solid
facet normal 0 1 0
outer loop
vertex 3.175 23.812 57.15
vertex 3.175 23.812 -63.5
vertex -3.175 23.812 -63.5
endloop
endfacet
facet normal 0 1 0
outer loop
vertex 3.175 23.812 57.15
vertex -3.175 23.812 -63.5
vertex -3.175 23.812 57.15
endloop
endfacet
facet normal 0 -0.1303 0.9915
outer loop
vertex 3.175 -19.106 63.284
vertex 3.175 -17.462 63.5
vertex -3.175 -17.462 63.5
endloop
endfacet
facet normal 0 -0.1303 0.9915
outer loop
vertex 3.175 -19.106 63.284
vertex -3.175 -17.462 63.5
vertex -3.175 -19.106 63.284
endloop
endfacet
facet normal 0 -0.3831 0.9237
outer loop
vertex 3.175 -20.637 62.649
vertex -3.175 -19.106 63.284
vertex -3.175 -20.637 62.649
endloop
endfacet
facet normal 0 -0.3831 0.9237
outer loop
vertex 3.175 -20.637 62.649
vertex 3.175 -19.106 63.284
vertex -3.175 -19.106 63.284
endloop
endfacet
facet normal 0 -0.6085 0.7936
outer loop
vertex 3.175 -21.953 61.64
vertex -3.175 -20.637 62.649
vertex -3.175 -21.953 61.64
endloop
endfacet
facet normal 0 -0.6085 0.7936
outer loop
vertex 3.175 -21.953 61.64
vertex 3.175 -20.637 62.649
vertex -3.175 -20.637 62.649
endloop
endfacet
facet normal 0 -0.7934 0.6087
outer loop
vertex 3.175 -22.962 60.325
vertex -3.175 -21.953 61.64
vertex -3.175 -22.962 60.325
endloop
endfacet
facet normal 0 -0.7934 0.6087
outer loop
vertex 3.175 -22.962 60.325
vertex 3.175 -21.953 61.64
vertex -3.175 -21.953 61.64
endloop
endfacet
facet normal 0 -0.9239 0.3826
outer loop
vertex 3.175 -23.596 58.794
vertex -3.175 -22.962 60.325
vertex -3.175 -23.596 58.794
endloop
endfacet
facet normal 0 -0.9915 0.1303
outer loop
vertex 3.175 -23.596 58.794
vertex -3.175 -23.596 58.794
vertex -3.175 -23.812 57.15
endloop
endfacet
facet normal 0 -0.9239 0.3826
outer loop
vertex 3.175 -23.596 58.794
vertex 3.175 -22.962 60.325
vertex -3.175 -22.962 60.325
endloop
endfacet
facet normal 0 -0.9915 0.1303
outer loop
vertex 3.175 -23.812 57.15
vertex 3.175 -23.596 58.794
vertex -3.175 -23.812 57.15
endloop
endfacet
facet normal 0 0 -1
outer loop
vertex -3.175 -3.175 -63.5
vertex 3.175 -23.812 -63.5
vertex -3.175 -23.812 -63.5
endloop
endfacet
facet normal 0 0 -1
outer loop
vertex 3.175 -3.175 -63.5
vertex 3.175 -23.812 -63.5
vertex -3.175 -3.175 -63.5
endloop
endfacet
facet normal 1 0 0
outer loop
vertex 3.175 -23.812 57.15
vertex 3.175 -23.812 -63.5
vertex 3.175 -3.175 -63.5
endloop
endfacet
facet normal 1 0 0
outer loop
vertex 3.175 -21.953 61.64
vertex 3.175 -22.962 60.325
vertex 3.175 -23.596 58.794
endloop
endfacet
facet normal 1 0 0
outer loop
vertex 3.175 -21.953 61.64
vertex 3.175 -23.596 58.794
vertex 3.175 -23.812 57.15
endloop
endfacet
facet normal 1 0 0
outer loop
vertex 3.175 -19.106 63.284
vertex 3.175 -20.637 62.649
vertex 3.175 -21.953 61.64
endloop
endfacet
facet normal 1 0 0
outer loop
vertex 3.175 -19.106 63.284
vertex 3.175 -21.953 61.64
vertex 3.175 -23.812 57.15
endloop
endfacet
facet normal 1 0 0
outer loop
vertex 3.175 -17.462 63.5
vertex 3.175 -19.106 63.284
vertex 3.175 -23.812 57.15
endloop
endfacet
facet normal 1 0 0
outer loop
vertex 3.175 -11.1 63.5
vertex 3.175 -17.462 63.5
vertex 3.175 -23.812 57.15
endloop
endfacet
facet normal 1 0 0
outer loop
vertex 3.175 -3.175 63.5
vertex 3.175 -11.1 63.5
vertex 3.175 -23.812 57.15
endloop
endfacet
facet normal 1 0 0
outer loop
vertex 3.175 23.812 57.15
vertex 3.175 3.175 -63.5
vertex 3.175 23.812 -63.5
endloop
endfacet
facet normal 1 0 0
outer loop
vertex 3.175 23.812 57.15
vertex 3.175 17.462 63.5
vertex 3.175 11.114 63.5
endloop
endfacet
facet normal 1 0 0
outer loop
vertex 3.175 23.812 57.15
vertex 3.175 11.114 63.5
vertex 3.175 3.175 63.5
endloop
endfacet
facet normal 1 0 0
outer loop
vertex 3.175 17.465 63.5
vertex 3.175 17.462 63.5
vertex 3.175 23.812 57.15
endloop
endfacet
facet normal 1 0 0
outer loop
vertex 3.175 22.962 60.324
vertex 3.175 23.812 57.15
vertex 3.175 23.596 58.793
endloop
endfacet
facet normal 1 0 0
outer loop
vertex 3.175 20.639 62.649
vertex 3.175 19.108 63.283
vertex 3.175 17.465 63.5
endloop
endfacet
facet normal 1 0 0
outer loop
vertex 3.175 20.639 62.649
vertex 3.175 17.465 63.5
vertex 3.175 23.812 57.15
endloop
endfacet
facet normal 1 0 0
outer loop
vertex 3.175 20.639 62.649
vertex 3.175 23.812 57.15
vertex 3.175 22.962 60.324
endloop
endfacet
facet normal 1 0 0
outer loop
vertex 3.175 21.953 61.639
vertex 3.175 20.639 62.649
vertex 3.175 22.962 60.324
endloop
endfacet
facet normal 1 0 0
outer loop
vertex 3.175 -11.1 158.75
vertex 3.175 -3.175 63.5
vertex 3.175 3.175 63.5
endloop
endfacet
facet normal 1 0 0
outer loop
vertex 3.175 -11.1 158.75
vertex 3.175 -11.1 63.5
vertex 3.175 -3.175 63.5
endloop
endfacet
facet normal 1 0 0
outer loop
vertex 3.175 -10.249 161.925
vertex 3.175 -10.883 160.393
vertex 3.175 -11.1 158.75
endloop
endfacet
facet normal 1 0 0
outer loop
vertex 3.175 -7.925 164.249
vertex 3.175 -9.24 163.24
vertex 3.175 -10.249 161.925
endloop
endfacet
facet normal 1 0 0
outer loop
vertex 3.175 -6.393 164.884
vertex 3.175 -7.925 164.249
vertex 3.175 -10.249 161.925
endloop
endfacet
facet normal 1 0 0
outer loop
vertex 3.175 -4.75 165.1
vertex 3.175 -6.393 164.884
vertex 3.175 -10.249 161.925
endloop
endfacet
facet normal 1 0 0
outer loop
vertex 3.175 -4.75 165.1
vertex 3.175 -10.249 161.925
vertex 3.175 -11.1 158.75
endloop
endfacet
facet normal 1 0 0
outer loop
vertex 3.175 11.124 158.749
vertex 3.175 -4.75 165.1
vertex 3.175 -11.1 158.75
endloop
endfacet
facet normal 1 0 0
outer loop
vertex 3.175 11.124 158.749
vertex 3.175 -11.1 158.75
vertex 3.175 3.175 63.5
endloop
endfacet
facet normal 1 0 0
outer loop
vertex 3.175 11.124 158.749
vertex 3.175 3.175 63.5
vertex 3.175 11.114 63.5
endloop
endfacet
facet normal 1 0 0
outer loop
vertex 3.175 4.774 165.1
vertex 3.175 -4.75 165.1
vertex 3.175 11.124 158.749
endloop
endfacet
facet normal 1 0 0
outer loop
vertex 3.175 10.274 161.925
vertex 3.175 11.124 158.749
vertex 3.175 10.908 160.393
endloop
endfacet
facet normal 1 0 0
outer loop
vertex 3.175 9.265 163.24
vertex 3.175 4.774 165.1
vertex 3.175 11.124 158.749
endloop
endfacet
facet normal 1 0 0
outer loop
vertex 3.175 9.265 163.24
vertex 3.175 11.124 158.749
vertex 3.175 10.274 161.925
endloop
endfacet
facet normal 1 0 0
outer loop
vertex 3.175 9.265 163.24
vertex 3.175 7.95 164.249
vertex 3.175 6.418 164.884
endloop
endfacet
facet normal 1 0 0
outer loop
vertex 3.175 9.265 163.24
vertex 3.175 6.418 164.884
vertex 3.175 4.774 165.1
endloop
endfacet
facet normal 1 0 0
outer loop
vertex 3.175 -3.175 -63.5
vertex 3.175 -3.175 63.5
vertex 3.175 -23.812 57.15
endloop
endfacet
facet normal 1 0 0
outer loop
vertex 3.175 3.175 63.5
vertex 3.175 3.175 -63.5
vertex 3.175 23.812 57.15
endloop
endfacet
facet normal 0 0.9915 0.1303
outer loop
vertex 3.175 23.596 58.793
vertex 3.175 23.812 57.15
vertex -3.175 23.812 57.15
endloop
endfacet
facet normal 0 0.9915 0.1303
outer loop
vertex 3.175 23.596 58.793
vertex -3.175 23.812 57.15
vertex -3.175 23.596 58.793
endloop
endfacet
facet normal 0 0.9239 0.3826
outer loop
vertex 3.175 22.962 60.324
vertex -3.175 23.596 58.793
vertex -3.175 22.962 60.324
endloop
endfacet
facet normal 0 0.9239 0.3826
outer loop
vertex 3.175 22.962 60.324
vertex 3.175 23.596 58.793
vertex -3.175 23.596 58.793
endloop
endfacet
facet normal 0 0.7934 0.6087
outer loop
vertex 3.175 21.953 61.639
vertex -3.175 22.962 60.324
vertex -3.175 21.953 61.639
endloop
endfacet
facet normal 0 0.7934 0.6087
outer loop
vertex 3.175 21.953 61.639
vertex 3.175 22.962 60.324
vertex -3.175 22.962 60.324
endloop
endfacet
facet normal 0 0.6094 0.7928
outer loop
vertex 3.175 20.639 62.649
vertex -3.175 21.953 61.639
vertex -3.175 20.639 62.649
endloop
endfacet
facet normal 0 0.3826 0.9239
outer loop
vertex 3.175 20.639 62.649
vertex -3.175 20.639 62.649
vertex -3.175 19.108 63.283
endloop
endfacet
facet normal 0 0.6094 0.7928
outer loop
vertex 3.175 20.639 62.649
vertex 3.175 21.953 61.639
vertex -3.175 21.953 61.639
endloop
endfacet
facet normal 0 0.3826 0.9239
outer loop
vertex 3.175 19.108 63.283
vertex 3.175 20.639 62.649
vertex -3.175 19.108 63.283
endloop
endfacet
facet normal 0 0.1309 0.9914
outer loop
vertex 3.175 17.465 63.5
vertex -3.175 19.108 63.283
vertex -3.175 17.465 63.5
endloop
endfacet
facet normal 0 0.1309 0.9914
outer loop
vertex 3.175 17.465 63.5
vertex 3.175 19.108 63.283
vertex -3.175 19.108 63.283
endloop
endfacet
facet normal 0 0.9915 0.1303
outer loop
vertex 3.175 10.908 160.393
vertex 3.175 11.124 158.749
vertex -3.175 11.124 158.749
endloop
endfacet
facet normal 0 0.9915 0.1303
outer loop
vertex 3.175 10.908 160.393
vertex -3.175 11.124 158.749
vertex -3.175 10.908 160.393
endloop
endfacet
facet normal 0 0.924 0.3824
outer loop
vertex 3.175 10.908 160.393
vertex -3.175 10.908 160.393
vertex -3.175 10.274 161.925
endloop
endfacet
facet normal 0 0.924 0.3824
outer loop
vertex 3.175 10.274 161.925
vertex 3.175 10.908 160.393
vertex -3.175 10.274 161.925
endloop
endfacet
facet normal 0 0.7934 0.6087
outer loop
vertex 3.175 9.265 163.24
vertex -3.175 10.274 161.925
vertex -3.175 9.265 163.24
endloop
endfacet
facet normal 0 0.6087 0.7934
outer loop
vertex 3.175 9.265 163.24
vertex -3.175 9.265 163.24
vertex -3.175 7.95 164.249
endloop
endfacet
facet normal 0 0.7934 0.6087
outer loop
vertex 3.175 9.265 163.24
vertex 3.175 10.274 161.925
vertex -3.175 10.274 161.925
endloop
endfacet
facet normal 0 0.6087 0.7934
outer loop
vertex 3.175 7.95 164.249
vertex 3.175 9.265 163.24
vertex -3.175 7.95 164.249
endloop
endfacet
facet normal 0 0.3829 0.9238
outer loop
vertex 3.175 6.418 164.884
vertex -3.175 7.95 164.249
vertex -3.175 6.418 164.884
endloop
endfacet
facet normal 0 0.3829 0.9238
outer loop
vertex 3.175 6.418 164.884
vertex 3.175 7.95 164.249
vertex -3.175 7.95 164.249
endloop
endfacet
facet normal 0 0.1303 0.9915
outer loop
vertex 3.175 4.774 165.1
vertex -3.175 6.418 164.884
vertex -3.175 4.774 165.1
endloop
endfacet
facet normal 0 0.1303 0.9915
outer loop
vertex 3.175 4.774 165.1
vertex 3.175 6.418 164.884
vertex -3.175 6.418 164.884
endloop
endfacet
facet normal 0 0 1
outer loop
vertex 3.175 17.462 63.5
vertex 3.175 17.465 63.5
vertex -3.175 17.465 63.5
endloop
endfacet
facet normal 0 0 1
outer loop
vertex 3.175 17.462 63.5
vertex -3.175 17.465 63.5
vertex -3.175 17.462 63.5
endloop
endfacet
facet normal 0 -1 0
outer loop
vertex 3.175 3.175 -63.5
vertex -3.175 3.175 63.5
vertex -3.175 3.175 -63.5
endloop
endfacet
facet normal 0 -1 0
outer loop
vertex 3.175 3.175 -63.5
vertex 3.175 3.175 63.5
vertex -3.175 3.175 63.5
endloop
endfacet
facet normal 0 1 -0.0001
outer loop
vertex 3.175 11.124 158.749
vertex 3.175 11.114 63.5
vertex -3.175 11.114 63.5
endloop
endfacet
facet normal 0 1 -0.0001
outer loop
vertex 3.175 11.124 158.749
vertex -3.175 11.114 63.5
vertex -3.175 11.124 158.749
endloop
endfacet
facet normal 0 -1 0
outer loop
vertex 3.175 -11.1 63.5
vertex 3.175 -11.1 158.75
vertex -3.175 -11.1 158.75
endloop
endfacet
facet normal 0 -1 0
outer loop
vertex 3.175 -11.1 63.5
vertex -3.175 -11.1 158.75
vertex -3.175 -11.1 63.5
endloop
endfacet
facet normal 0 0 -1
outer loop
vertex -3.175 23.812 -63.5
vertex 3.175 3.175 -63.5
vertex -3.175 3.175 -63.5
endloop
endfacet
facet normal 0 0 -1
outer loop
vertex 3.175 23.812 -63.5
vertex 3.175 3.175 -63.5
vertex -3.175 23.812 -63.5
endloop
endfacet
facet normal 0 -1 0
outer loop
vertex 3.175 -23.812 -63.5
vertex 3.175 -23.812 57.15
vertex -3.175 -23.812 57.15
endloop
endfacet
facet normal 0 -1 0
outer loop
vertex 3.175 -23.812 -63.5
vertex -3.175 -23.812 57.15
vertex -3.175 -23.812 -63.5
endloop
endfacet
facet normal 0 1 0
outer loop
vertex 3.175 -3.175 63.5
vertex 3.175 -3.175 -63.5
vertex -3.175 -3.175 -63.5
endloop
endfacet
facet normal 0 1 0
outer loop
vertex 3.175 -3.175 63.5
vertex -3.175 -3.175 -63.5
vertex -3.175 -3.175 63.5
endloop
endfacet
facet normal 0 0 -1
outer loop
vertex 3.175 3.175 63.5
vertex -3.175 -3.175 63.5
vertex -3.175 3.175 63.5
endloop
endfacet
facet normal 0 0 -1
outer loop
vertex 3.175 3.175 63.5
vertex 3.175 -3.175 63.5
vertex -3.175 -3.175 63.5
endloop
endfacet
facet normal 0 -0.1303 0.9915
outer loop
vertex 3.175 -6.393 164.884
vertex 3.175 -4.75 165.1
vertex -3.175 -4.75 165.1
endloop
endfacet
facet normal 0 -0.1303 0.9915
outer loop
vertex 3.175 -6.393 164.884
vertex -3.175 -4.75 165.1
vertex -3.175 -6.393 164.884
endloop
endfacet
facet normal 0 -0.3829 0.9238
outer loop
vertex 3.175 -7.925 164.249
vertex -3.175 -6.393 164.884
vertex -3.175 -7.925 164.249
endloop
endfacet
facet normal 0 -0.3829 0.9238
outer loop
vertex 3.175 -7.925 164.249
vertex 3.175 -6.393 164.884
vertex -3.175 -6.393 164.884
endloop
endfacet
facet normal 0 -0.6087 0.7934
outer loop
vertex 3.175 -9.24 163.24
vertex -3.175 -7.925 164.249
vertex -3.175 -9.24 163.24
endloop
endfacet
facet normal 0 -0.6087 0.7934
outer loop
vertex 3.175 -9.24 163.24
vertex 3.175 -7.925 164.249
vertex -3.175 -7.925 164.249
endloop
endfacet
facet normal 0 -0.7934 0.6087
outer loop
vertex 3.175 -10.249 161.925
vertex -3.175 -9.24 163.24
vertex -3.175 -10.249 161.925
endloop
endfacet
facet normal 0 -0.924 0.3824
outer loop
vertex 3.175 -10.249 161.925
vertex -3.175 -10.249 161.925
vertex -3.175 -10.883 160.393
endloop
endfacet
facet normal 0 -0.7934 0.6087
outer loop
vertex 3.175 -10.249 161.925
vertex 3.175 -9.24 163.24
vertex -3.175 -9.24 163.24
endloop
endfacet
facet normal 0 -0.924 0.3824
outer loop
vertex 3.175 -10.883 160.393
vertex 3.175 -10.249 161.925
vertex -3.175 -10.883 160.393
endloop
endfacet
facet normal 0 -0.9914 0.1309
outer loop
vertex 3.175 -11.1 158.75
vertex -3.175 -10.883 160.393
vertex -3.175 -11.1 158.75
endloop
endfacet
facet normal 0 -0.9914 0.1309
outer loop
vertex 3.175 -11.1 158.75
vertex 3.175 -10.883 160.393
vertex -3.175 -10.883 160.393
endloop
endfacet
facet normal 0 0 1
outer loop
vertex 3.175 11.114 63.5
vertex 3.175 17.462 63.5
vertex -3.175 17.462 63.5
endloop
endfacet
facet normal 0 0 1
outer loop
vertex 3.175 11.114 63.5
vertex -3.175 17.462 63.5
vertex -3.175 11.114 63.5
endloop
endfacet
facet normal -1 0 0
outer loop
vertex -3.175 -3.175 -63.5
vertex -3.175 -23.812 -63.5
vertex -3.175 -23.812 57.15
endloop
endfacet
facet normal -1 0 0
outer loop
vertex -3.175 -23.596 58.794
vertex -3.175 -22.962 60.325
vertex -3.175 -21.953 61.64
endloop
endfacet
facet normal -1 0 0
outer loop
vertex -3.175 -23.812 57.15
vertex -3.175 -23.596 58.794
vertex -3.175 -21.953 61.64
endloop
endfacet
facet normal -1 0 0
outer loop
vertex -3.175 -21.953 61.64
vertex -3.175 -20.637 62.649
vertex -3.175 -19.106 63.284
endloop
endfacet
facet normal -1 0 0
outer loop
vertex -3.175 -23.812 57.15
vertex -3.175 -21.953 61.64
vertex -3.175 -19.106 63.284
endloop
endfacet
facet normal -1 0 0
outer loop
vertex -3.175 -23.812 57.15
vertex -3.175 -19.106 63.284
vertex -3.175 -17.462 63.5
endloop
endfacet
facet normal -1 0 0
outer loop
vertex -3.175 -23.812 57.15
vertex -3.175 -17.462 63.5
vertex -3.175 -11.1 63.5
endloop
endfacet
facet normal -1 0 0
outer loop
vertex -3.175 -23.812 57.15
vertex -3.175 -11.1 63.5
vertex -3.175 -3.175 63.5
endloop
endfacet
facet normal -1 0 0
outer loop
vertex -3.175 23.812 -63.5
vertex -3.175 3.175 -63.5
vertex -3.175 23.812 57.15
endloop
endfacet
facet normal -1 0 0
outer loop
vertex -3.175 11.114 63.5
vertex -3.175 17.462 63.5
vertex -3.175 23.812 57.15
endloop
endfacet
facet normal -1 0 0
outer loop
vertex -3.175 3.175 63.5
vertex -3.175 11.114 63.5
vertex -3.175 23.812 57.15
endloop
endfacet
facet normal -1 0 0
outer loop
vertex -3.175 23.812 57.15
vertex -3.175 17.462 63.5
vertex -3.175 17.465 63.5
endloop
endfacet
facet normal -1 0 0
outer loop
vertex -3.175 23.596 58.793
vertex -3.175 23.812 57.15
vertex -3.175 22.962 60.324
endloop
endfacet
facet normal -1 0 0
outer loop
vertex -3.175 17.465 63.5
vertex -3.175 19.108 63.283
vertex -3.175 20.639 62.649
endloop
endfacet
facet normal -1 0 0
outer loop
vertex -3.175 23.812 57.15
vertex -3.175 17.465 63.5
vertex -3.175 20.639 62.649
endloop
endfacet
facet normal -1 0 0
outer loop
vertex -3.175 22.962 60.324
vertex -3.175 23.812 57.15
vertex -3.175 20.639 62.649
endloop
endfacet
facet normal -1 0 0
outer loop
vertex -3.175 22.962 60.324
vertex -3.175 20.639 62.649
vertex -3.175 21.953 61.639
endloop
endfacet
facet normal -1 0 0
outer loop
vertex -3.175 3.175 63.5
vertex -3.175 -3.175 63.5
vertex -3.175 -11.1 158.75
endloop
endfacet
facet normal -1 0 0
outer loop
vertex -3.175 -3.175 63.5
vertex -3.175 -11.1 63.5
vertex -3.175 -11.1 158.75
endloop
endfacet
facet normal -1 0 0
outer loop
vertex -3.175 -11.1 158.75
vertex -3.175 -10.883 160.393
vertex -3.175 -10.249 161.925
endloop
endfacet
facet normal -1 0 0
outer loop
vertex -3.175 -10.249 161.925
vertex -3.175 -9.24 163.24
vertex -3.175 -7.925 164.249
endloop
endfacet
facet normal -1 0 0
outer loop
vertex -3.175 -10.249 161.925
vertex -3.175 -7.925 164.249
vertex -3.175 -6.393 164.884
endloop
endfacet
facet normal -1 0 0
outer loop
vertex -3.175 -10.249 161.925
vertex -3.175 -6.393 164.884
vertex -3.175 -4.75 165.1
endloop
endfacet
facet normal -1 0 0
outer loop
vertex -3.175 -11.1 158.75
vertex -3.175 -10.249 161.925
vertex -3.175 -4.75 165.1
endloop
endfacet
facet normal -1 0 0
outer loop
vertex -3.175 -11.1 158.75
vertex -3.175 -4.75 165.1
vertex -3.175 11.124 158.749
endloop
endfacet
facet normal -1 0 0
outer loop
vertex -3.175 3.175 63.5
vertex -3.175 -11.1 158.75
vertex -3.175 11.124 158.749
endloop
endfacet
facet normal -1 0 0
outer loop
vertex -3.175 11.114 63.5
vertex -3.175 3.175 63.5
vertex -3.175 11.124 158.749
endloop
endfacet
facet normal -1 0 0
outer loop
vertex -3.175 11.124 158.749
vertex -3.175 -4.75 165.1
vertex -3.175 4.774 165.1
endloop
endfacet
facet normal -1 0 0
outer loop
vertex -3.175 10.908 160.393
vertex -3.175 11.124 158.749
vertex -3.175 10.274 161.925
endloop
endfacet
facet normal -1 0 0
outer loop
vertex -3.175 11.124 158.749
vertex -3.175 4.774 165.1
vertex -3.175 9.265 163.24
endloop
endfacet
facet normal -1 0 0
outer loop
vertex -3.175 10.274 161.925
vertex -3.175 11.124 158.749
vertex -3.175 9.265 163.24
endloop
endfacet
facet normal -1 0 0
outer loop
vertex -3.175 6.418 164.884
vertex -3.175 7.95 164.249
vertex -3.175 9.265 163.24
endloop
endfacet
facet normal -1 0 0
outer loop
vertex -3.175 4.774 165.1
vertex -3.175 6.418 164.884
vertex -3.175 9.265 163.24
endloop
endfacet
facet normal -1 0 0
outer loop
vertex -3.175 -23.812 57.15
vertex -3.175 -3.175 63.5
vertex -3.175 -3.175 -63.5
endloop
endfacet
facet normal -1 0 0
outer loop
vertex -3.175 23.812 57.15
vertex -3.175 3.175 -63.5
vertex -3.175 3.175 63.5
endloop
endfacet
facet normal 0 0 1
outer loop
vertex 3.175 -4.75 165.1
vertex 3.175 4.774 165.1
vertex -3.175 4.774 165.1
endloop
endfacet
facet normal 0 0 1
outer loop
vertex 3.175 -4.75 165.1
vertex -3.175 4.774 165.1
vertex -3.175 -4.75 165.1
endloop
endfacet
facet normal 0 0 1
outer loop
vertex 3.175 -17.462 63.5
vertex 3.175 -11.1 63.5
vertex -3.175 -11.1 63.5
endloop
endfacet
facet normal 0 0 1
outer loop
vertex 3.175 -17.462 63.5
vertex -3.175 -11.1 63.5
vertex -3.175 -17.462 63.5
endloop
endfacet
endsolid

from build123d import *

# Parameters (mm, degrees)
F1_DEPTH = 3.175


# Not quite as in the source:
# - ends of sketch curves that miss each other by under 0.0002 mm in the source are joined


with BuildPart() as f1:
    # F0 (on Right) → F1 (new body, symmetric)
    with BuildSketch(Plane.YZ):
        with BuildLine():
            Line((3.175, -63.5), (23.8125, -63.5))
            Line((23.8125, -63.5), (23.8125, 57.15))
            ThreePointArc((23.8125, 57.15), (21.9533763667, 61.6393796296), (17.4646167058, 63.4999996472))
            Line((17.4646167058, 63.4999996472), (17.4625, 63.5))
            Line((17.4625, 63.5), (11.1139111112, 63.5))
            Line((11.1139111112, 63.5), (11.124494366, 158.7492930333))
            ThreePointArc((11.124494366, 158.7492930333), (9.2648719104, 163.2398771909), (4.7744944052, 165.0999985889))
            Line((4.7744944052, 165.0999985889), (-4.7498, 165.0999985889))
            ThreePointArc((-4.7498, 165.0999985889), (-9.2399280605, 163.2401266494), (-11.0998, 158.7499985889))
            Line((-11.0998, 158.7499985889), (-11.0998, 63.5))
            Line((-11.0998, 63.5), (-17.4498, 63.5))
            Line((-17.4498, 63.5), (-17.4625, 63.5))
            ThreePointArc((-17.4625, 63.5), (-21.9526280605, 61.6401280605), (-23.8125, 57.15))
            Line((-23.8125, 57.15), (-23.8125, -63.5))
            Line((-23.8125, -63.5), (-3.175, -63.5))
            Line((-3.175, -63.5), (-3.175, 63.5))
            Line((-3.175, 63.5), (3.175, 63.5))
            Line((3.175, 63.5), (3.175, -63.5))
        make_face()
    extrude(amount=F1_DEPTH, both=True)


solid = f1.part
